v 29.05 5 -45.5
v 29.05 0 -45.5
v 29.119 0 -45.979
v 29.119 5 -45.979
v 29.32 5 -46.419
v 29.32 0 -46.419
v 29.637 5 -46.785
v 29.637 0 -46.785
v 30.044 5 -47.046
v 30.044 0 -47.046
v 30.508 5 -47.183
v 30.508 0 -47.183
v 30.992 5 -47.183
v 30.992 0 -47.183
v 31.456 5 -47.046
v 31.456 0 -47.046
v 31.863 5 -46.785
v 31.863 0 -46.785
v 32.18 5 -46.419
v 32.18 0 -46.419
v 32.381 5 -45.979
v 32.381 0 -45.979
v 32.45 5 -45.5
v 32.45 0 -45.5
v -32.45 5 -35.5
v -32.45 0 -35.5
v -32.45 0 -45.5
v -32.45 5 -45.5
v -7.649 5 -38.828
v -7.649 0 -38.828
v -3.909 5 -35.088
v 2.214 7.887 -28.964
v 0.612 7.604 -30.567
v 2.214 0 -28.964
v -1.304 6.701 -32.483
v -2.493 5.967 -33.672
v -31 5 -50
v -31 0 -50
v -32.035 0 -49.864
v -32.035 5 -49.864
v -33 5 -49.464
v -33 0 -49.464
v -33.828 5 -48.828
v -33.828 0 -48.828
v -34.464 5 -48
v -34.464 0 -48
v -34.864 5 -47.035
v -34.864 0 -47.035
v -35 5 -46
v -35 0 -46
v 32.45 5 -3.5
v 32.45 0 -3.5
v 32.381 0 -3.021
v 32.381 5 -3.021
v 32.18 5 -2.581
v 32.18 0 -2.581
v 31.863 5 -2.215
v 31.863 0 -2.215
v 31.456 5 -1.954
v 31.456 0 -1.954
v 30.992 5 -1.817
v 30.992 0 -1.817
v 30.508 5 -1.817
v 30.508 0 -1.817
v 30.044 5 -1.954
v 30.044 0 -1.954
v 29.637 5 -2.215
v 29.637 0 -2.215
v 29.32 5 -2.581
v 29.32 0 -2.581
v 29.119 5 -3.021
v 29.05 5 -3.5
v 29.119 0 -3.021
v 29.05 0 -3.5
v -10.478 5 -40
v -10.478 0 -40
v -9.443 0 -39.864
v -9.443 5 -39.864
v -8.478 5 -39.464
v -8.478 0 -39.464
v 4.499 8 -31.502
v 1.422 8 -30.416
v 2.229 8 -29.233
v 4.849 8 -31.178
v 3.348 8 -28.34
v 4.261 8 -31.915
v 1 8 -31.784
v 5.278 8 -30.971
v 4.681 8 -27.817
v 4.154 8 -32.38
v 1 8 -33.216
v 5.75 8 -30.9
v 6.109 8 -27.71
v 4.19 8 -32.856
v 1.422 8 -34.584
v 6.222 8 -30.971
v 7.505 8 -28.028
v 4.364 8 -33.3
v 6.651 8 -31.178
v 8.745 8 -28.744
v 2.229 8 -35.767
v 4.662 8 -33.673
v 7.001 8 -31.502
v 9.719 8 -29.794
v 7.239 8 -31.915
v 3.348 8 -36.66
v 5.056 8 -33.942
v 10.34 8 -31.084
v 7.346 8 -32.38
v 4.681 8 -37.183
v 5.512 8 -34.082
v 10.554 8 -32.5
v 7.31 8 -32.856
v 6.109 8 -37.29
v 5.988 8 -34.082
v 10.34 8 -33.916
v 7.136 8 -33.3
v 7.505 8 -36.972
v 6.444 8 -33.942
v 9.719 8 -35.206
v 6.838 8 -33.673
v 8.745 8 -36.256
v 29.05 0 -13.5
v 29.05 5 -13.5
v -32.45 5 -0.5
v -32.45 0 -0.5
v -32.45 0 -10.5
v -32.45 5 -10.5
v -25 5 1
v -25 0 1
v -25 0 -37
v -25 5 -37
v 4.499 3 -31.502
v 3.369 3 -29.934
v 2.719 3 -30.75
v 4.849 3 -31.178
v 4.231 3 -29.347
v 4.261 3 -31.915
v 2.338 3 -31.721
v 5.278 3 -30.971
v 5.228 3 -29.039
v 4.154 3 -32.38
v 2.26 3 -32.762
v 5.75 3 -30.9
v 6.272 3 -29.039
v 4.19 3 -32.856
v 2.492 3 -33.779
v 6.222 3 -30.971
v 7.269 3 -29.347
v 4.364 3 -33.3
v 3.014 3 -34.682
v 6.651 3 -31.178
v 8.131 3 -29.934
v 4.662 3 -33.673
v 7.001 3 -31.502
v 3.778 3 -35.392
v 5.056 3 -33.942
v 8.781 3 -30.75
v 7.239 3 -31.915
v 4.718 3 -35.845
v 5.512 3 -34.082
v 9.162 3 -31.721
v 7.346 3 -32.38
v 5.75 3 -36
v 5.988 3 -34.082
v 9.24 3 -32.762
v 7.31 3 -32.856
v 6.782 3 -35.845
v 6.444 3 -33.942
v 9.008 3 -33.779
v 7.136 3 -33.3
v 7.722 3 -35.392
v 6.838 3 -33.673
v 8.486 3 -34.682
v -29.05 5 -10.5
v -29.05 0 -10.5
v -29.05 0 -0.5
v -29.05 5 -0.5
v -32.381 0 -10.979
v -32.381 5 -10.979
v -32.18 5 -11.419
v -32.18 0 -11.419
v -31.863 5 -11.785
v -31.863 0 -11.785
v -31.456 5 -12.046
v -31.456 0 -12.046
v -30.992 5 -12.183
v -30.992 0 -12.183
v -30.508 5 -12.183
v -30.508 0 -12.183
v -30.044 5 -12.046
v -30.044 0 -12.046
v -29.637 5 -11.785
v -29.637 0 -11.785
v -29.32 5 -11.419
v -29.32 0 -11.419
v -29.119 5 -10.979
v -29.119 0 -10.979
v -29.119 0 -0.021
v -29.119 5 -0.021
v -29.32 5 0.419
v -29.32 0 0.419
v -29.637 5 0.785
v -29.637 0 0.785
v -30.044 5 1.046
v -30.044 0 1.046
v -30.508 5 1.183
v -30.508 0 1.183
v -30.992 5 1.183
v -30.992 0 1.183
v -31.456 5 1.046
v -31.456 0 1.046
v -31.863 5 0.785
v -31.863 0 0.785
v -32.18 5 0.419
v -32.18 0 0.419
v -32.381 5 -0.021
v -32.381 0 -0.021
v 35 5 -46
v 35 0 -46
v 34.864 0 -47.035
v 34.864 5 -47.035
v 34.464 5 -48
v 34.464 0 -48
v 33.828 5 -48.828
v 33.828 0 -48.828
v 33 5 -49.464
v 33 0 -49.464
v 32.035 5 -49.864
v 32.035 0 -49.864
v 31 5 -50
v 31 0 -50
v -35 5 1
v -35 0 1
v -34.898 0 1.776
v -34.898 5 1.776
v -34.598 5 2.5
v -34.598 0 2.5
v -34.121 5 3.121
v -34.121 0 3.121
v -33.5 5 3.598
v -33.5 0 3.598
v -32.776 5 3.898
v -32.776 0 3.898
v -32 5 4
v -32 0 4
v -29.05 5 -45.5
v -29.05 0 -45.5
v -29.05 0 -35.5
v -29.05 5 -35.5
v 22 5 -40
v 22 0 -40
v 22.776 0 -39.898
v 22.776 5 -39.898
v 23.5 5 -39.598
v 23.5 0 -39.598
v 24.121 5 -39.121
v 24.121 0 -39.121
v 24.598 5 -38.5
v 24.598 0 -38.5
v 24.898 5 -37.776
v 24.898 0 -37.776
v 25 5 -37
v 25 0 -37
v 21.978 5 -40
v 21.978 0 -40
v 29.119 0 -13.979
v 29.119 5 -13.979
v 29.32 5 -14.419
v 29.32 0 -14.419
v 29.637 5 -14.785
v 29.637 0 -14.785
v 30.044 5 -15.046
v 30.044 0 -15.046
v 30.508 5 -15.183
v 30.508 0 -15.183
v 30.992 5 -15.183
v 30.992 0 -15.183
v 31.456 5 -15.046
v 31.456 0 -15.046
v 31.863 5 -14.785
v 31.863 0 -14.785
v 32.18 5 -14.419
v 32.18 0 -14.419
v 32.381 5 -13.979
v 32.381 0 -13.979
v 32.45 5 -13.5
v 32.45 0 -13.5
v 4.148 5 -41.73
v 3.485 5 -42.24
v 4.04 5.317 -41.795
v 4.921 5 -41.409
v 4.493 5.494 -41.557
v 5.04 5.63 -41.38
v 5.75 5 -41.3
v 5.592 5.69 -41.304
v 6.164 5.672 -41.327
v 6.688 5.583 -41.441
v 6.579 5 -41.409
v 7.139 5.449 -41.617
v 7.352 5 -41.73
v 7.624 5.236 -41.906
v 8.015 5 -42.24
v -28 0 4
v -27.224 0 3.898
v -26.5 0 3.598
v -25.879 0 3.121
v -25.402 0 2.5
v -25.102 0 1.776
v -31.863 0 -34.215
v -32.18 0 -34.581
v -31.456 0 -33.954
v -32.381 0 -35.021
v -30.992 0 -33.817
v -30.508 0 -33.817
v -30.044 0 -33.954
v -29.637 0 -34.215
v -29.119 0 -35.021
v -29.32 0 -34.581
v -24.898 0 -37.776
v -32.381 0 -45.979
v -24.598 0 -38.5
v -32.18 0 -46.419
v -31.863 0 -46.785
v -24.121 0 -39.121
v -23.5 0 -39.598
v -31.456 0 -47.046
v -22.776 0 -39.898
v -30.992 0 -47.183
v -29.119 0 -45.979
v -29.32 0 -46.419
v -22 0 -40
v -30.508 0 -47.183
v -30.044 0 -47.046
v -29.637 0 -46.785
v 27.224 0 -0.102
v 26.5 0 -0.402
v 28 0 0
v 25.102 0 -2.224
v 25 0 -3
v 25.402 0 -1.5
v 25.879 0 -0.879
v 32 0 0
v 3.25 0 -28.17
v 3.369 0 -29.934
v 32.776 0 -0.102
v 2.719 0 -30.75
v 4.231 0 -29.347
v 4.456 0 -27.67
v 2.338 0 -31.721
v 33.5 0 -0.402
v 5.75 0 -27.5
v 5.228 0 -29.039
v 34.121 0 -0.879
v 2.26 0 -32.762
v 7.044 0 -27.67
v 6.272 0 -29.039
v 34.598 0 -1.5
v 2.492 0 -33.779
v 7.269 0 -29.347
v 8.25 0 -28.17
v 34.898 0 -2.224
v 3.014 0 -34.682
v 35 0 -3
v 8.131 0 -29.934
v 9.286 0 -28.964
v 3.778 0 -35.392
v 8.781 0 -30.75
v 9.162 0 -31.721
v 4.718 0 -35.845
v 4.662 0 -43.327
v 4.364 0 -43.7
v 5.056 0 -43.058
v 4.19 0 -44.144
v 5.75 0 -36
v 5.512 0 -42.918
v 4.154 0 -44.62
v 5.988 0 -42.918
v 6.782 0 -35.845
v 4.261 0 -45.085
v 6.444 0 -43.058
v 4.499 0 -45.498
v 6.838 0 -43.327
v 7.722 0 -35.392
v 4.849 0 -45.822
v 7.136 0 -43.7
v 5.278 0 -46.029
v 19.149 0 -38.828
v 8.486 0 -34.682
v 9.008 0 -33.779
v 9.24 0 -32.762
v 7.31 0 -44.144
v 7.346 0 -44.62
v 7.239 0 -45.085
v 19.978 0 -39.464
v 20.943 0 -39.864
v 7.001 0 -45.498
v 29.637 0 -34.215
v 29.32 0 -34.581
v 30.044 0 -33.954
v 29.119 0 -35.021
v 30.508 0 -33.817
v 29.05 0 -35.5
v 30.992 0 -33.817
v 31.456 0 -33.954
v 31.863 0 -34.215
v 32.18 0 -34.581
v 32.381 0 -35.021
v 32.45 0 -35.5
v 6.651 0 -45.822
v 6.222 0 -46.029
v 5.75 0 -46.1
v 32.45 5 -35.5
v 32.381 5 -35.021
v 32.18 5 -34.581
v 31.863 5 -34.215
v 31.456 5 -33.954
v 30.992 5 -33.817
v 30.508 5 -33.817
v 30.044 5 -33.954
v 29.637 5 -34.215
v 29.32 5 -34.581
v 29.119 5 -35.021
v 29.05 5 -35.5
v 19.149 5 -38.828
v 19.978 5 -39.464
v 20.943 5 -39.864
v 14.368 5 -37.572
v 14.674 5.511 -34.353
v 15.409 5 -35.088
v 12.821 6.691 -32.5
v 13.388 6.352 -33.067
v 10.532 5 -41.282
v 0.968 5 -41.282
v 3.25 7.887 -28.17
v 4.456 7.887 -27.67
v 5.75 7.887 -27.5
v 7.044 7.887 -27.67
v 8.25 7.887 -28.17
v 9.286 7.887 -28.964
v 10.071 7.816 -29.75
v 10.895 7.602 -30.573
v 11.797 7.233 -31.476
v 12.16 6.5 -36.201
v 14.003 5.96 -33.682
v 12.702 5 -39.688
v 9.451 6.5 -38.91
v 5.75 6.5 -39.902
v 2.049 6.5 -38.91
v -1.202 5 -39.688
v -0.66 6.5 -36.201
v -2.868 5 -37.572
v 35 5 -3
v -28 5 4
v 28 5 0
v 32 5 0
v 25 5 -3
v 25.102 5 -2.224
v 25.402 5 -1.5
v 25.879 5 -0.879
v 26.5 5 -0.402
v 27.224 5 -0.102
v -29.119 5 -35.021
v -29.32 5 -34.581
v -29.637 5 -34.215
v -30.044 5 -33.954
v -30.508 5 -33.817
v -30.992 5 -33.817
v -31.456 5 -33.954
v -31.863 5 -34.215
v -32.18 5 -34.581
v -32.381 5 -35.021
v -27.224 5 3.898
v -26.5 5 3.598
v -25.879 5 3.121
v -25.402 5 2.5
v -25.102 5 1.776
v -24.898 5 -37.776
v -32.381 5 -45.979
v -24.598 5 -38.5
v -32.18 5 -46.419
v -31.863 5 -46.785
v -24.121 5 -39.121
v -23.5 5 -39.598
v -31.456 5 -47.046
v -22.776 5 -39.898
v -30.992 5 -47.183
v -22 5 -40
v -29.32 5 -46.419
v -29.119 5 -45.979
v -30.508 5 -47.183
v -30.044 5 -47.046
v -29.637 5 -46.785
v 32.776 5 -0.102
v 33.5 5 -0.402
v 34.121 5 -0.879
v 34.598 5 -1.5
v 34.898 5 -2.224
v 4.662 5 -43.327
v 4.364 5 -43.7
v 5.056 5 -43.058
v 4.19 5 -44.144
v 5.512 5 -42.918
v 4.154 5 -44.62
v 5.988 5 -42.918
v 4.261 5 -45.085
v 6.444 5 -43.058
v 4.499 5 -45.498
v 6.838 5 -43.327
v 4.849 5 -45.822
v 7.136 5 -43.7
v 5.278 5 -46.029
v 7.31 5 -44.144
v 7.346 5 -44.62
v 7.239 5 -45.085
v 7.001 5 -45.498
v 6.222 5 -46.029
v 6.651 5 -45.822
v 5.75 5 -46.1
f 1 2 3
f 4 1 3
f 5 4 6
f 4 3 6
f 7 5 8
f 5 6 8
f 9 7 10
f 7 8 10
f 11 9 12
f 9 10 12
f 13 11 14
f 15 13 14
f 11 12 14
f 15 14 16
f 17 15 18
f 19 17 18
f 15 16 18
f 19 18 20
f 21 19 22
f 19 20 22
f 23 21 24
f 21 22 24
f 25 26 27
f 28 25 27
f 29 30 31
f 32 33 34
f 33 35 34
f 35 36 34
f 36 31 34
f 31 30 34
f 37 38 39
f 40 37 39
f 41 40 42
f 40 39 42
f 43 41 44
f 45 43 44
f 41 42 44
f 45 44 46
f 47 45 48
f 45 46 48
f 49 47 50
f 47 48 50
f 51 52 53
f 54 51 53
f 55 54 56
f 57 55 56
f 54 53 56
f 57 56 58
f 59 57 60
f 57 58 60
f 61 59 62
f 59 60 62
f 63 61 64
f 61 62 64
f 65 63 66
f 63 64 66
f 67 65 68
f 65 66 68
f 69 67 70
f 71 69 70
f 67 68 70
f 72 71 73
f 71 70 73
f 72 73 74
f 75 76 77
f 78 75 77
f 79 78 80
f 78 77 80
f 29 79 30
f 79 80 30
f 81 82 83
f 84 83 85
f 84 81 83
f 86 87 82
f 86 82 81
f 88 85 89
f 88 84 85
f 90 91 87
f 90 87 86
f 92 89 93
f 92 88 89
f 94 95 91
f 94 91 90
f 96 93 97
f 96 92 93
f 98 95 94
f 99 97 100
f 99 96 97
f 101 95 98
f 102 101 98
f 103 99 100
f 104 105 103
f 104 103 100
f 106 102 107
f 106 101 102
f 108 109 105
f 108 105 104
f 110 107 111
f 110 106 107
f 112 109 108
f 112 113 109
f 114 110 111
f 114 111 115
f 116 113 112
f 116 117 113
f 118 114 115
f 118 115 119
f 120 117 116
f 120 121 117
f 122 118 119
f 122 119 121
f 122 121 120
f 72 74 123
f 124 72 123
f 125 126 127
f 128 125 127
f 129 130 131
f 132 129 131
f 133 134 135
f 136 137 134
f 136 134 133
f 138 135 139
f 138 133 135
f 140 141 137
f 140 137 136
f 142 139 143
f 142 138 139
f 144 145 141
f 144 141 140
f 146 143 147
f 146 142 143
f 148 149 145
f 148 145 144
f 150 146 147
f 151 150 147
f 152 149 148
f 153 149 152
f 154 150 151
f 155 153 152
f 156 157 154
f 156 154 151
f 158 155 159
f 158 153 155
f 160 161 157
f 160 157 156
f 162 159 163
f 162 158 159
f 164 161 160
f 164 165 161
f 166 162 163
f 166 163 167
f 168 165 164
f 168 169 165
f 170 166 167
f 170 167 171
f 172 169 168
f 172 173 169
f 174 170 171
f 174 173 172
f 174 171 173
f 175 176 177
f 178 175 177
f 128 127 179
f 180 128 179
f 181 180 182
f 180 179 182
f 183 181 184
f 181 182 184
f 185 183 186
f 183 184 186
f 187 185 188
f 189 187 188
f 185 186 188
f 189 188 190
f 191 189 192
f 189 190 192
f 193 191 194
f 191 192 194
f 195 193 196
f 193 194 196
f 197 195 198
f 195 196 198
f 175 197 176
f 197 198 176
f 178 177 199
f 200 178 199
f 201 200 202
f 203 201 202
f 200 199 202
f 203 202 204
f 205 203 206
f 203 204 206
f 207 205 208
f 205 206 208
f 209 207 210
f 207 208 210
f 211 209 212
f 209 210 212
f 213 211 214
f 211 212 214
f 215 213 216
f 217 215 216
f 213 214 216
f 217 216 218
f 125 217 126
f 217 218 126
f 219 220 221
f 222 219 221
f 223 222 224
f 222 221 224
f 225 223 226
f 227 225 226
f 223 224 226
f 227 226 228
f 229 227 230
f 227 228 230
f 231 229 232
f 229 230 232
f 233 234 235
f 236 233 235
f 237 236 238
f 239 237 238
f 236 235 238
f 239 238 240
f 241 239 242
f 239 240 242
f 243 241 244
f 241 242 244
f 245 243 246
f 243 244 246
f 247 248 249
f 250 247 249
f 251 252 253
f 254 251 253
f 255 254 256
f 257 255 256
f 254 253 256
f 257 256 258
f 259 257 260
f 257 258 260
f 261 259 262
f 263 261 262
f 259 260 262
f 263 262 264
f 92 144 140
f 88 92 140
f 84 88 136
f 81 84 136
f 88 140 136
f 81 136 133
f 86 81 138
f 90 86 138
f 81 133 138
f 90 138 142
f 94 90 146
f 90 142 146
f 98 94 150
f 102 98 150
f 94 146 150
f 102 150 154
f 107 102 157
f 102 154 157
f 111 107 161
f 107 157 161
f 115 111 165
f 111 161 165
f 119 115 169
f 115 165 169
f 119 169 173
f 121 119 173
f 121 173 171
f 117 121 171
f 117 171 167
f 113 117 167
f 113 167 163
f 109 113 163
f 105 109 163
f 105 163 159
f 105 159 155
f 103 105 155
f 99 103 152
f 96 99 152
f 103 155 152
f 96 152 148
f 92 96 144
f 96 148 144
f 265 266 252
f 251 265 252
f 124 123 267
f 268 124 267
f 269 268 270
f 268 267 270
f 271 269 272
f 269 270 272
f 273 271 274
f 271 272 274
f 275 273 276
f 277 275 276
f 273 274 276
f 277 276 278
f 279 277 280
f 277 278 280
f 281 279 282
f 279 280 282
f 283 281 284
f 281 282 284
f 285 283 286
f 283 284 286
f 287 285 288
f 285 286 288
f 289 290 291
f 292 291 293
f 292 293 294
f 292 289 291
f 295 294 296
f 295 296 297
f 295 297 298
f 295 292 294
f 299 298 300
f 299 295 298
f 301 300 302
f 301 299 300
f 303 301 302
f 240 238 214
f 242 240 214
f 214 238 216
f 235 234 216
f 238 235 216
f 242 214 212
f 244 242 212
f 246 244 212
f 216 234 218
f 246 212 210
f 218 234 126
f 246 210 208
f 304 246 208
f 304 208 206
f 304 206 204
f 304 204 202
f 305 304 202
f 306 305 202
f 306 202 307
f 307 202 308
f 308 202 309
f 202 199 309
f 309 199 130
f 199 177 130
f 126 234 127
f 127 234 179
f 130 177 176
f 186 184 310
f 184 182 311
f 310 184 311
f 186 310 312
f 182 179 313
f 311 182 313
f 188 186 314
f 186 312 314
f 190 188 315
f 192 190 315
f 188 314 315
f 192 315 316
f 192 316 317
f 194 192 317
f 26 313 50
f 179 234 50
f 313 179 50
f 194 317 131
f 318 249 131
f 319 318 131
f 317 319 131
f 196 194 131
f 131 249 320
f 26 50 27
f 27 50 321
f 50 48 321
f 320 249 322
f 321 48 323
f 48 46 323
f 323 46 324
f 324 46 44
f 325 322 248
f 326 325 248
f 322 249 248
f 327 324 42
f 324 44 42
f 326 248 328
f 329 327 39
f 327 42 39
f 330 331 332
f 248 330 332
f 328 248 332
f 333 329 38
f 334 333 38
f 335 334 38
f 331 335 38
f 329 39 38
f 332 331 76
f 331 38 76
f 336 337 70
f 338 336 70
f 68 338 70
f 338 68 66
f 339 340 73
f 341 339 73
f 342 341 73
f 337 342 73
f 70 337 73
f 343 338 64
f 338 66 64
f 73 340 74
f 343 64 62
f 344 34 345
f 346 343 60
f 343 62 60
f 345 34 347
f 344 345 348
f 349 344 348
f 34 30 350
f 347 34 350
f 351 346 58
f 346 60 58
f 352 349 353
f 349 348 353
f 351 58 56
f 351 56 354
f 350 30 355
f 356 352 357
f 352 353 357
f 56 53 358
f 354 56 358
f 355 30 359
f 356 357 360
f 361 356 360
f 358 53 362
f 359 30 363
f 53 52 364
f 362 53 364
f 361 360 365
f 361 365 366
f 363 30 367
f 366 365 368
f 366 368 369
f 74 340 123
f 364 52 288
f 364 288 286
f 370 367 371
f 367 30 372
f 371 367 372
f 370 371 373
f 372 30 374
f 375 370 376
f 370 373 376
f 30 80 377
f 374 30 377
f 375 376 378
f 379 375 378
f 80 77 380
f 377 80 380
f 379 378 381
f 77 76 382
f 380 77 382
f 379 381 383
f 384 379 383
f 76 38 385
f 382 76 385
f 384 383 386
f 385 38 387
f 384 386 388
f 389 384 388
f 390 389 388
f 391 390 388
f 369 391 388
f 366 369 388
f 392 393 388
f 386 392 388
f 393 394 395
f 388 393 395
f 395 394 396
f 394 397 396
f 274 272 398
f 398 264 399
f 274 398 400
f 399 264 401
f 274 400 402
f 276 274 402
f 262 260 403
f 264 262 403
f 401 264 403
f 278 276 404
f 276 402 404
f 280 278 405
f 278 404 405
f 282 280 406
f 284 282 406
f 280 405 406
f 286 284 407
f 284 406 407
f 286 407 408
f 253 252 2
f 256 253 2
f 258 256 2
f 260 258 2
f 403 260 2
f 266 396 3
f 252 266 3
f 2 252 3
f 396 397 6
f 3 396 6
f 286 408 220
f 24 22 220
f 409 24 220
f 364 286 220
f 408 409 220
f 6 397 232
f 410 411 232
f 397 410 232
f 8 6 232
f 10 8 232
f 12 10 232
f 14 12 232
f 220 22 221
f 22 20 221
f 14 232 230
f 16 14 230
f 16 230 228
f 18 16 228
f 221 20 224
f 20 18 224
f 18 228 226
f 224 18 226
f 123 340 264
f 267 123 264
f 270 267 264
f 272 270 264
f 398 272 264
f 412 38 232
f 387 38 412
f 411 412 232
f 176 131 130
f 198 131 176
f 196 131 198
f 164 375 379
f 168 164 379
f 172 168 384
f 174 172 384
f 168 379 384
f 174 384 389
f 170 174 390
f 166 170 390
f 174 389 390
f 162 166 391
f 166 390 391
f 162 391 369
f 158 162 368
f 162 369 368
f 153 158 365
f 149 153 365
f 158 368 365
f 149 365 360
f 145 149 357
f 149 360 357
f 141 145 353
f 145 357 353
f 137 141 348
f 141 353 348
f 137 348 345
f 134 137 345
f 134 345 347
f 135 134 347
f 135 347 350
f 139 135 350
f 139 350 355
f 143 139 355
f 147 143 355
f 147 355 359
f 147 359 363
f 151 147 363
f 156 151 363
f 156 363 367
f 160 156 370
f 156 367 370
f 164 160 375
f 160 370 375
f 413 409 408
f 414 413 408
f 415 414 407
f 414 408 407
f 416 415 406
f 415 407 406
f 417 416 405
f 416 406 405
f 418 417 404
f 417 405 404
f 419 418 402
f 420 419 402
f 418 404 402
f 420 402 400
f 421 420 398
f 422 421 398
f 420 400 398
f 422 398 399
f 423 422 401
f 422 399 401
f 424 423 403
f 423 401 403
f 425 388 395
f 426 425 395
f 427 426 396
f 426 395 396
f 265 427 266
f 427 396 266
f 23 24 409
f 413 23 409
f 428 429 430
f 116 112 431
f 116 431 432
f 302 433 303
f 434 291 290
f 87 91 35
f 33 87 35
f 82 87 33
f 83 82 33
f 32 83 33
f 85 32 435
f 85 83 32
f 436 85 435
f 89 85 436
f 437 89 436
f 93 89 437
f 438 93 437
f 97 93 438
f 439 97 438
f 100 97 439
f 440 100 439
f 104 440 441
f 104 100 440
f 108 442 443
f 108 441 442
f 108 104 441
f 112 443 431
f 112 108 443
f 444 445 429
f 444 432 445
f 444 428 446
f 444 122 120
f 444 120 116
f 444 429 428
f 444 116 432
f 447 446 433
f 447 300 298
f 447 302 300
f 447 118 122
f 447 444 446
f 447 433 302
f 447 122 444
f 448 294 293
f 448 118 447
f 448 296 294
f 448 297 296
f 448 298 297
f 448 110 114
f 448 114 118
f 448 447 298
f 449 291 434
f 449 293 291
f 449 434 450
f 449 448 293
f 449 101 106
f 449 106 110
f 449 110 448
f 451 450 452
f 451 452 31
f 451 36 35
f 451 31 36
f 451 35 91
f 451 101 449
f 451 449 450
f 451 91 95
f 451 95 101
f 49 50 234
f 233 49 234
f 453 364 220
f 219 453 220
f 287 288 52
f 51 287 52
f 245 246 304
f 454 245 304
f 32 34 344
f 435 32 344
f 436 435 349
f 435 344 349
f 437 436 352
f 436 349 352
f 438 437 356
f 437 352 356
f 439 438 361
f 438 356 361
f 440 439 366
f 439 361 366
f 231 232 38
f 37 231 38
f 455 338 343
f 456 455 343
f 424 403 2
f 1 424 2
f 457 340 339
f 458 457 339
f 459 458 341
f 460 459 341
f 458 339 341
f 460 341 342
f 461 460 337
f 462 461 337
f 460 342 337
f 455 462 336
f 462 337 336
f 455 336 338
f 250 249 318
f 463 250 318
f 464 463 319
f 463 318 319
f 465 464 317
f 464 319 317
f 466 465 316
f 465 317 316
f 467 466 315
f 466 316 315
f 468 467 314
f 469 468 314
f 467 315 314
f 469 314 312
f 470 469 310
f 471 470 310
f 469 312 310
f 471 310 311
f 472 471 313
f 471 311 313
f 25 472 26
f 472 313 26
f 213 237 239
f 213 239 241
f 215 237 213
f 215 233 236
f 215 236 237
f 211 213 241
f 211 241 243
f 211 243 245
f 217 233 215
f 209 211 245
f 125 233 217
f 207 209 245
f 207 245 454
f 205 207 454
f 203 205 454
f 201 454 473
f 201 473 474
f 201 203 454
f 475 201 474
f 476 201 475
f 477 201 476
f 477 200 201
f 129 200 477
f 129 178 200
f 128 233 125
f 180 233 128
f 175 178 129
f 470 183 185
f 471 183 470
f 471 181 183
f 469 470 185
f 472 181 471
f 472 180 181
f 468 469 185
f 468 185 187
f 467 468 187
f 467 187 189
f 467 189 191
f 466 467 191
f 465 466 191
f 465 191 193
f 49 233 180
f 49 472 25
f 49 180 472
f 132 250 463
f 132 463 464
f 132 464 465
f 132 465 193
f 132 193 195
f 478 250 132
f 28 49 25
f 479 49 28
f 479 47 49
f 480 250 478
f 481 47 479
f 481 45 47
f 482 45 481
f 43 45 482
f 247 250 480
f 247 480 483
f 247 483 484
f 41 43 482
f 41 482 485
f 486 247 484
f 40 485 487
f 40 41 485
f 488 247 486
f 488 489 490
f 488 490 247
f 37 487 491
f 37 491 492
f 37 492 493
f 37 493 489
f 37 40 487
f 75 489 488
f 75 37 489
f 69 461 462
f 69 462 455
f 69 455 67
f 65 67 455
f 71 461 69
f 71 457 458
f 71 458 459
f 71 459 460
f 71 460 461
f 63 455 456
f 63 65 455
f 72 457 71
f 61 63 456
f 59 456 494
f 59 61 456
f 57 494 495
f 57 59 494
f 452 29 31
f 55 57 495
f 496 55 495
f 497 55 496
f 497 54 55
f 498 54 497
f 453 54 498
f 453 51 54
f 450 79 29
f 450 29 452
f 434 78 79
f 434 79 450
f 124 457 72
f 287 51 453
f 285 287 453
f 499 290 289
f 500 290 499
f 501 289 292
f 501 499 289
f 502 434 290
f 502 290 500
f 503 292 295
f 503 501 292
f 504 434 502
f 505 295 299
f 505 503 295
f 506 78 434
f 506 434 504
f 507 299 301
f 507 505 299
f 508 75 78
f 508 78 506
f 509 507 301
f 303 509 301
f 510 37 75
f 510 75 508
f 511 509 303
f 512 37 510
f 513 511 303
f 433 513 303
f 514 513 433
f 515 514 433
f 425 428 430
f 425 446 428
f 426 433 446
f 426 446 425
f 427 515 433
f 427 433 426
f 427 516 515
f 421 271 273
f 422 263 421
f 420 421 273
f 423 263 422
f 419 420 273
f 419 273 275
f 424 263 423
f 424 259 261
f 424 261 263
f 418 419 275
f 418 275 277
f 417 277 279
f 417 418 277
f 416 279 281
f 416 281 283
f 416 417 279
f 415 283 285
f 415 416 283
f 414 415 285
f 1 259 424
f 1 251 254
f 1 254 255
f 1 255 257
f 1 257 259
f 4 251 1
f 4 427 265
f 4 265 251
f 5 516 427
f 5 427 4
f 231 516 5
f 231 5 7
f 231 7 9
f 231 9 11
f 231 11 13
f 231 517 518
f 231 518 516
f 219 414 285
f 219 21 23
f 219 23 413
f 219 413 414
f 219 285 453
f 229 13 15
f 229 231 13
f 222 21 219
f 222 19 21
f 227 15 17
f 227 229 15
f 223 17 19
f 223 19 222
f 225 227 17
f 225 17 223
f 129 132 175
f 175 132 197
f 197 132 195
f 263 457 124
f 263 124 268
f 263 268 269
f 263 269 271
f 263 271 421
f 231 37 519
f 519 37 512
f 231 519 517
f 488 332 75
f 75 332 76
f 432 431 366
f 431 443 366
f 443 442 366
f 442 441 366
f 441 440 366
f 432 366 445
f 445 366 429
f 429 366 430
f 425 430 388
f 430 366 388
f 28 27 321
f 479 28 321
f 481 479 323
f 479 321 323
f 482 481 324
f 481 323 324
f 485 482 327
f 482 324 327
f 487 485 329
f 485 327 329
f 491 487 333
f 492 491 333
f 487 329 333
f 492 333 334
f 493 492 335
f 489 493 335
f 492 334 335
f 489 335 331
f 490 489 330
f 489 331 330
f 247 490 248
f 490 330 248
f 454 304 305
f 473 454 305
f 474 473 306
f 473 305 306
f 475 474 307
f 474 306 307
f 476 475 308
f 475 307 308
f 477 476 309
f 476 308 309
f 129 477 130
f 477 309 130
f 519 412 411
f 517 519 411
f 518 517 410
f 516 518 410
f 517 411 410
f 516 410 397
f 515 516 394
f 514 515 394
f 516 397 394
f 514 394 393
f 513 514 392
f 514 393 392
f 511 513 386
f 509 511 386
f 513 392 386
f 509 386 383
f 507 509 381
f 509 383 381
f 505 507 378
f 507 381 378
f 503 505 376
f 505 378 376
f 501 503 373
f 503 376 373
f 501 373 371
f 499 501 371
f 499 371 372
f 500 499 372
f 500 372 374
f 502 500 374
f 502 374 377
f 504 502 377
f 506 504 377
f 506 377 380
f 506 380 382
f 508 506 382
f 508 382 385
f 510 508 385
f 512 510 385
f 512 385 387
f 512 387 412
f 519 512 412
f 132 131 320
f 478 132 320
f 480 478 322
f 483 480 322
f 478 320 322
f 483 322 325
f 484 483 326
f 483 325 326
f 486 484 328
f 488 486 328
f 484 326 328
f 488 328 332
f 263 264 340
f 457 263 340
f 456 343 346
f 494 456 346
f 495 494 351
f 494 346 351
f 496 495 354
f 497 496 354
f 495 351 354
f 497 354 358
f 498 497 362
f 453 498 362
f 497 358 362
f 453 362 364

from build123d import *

# Parameters (mm, degrees)
SKETCH2_R           = 1.6
BOSS_EXTRUDE1_DEPTH = 5
SKETCH3_R           = 10
BOSS_EXTRUDE2_DEPTH = 3
BOSS_EXTRUDE2_TAPER = 60
CUT_EXTRUDE1_REACH  = 63.555
SKETCH4_R           = 1.6
SKETCH5_R           = 3.5
CUT_EXTRUDE2_DEPTH  = 3
SKETCH6_R           = 3.2
CUT_EXTRUDE3_DEPTH  = 3


with BuildPart() as part:
    # Sketch2 → Boss-Extrude1 (new body)
    with BuildSketch(Plane(origin=(0, 0, 0), x_dir=(1, 0, 0), z_dir=(0, 1, 0))):
        with BuildLine():
            Line((-25, 0), (-25, 37))
            ThreePointArc((-25, 37), (-24.121320344, 39.121320344), (-22, 40))
            Line((-22, 40), (-10.477922061, 40))
            ThreePointArc((-10.477922061, 40), (-8.947188332, 39.69551813), (-7.649494937, 38.828427125))
            Line((-7.649494937, 38.828427125), (2.214466094, 28.964466094))
            ThreePointArc((2.214466094, 28.964466094), (5.75, 27.5), (9.285533906, 28.964466094))
            Line((9.285533906, 28.964466094), (19.149494937, 38.828427125))
            ThreePointArc((19.149494937, 38.828427125), (20.447188332, 39.69551813), (21.977922061, 40))
            Line((21.977922061, 40), (22, 40))
            ThreePointArc((22, 40), (24.121320344, 39.121320344), (25, 37))
            Line((25, 37), (25, 3))
            ThreePointArc((25, 3), (25.878679656, 0.878679656), (28, 0))
            Line((28, 0), (32, 0))
            ThreePointArc((32, 0), (34.121320344, 0.878679656), (35, 3))
            Line((35, 3), (35, 46))
            ThreePointArc((35, 46), (33.828427125, 48.828427125), (31, 50))
            Line((31, 50), (-31, 50))
            ThreePointArc((-31, 50), (-33.828427125, 48.828427125), (-35, 46))
            Line((-35, 46), (-35, 0))
            Line((-35, 0), (-35, -1))
            ThreePointArc((-35, -1), (-34.121320344, -3.121320344), (-32, -4))
            Line((-32, -4), (-28, -4))
            ThreePointArc((-28, -4), (-25.878679656, -3.121320344), (-25, -1))
            Line((-25, -1), (-25, 0))
        make_face()
        with Locations(Location((5.75, 32.5, 0), (0, 0, 270))):
            Circle(SKETCH2_R, mode=Mode.SUBTRACT)
        with BuildLine():
            Line((32.45, 45.5), (32.45, 35.5))
            ThreePointArc((32.45, 35.5), (30.75, 33.8), (29.05, 35.5))
            Line((29.05, 35.5), (29.05, 45.5))
            ThreePointArc((29.05, 45.5), (30.75, 47.2), (32.45, 45.5))
        make_face(mode=Mode.SUBTRACT)
        with BuildLine():
            Line((32.45, 13.5), (32.45, 3.5))
            ThreePointArc((32.45, 3.5), (30.75, 1.8), (29.05, 3.5))
            Line((29.05, 3.5), (29.05, 13.5))
            ThreePointArc((29.05, 13.5), (30.75, 15.2), (32.45, 13.5))
        make_face(mode=Mode.SUBTRACT)
        with BuildLine():
            Line((-29.05, 45.5), (-29.05, 35.5))
            ThreePointArc((-29.05, 35.5), (-30.75, 33.8), (-32.45, 35.5))
            Line((-32.45, 35.5), (-32.45, 45.5))
            ThreePointArc((-32.45, 45.5), (-30.75, 47.2), (-29.05, 45.5))
        make_face(mode=Mode.SUBTRACT)
        with BuildLine():
            Line((-29.05, 10.5), (-29.05, 0.5))
            ThreePointArc((-29.05, 0.5), (-30.75, -1.2), (-32.45, 0.5))
            Line((-32.45, 0.5), (-32.45, 10.5))
            ThreePointArc((-32.45, 10.5), (-30.75, 12.2), (-29.05, 10.5))
        make_face(mode=Mode.SUBTRACT)
    extrude(amount=BOSS_EXTRUDE1_DEPTH)

    # Sketch3 → Boss-Extrude2 (add)
    with BuildSketch(Plane(origin=(0, 5, 0), x_dir=(1, 0, 0), z_dir=(0, 1, 0))):
        with Locations((5.75, 32.5)):
            Circle(SKETCH3_R)
    extrude(amount=BOSS_EXTRUDE2_DEPTH, taper=BOSS_EXTRUDE2_TAPER)

    # Sketch4 → Cut-Extrude1 (cut, up to next)
    with BuildSketch(Plane.XZ, mode=Mode.PRIVATE) as cut_extrude1_sk1:
        with Locations(Location((5.75, -32.5, 0), (0, 0, 90))):
            Circle(SKETCH4_R)
    cut_extrude1_tool1 = extrude(cut_extrude1_sk1.sketch, amount=-CUT_EXTRUDE1_REACH, mode=Mode.PRIVATE) & part.part
    # Sketch4 → Cut-Extrude1 (cut, up to next)
    with BuildSketch(Plane.XZ, mode=Mode.PRIVATE) as cut_extrude1_sk2:
        with Locations(Location((5.75, -44.5, 0), (0, 0, 270))):
            Circle(SKETCH4_R)
    cut_extrude1_tool2 = extrude(cut_extrude1_sk2.sketch, amount=-CUT_EXTRUDE1_REACH, mode=Mode.PRIVATE) & part.part
    # Sketch4 → Cut-Extrude1 (cut, up to next)
    with BuildSketch(Plane.XZ, mode=Mode.PRIVATE) as cut_extrude1_sk3:
        with BuildLine():
            Line((-3.909258263, -35.088190451), (2.214466094, -28.964466094))
            ThreePointArc((2.214466094, -28.964466094), (5.75, -27.5), (9.285533906, -28.964466094))
            Line((9.285533906, -28.964466094), (15.409258263, -35.088190451))
            ThreePointArc((15.409258263, -35.088190451), (5.75, -22.5), (-3.909258263, -35.088190451))
        make_face()
    cut_extrude1_tool3 = extrude(cut_extrude1_sk3.sketch, amount=-CUT_EXTRUDE1_REACH, mode=Mode.PRIVATE) & part.part
    add(cut_extrude1_tool1.solids().sort_by_distance((5.75, 0, -32.5))[0], mode=Mode.SUBTRACT)
    add(cut_extrude1_tool2.solids().sort_by_distance((5.75, 0, -44.5))[0], mode=Mode.SUBTRACT)
    add(cut_extrude1_tool3.solids().sort_by_distance((12.514498, 0, -31.859226))[0], mode=Mode.SUBTRACT)

    # Sketch5 → Cut-Extrude2 (cut)
    with BuildSketch(Plane.XZ):
        with Locations(Location((5.75, -32.5, 0), (0, 0, 270))):
            Circle(SKETCH5_R)
    extrude(amount=-CUT_EXTRUDE2_DEPTH, mode=Mode.SUBTRACT)

    # Sketch6 → Cut-Extrude3 (cut)
    with BuildSketch(Plane(origin=(0, 5, 0), x_dir=(1, 0, 0), z_dir=(0, 1, 0))):
        with Locations((5.75, 44.5)):
            Circle(SKETCH6_R)
    extrude(amount=CUT_EXTRUDE3_DEPTH, mode=Mode.SUBTRACT)


solid = part.part
